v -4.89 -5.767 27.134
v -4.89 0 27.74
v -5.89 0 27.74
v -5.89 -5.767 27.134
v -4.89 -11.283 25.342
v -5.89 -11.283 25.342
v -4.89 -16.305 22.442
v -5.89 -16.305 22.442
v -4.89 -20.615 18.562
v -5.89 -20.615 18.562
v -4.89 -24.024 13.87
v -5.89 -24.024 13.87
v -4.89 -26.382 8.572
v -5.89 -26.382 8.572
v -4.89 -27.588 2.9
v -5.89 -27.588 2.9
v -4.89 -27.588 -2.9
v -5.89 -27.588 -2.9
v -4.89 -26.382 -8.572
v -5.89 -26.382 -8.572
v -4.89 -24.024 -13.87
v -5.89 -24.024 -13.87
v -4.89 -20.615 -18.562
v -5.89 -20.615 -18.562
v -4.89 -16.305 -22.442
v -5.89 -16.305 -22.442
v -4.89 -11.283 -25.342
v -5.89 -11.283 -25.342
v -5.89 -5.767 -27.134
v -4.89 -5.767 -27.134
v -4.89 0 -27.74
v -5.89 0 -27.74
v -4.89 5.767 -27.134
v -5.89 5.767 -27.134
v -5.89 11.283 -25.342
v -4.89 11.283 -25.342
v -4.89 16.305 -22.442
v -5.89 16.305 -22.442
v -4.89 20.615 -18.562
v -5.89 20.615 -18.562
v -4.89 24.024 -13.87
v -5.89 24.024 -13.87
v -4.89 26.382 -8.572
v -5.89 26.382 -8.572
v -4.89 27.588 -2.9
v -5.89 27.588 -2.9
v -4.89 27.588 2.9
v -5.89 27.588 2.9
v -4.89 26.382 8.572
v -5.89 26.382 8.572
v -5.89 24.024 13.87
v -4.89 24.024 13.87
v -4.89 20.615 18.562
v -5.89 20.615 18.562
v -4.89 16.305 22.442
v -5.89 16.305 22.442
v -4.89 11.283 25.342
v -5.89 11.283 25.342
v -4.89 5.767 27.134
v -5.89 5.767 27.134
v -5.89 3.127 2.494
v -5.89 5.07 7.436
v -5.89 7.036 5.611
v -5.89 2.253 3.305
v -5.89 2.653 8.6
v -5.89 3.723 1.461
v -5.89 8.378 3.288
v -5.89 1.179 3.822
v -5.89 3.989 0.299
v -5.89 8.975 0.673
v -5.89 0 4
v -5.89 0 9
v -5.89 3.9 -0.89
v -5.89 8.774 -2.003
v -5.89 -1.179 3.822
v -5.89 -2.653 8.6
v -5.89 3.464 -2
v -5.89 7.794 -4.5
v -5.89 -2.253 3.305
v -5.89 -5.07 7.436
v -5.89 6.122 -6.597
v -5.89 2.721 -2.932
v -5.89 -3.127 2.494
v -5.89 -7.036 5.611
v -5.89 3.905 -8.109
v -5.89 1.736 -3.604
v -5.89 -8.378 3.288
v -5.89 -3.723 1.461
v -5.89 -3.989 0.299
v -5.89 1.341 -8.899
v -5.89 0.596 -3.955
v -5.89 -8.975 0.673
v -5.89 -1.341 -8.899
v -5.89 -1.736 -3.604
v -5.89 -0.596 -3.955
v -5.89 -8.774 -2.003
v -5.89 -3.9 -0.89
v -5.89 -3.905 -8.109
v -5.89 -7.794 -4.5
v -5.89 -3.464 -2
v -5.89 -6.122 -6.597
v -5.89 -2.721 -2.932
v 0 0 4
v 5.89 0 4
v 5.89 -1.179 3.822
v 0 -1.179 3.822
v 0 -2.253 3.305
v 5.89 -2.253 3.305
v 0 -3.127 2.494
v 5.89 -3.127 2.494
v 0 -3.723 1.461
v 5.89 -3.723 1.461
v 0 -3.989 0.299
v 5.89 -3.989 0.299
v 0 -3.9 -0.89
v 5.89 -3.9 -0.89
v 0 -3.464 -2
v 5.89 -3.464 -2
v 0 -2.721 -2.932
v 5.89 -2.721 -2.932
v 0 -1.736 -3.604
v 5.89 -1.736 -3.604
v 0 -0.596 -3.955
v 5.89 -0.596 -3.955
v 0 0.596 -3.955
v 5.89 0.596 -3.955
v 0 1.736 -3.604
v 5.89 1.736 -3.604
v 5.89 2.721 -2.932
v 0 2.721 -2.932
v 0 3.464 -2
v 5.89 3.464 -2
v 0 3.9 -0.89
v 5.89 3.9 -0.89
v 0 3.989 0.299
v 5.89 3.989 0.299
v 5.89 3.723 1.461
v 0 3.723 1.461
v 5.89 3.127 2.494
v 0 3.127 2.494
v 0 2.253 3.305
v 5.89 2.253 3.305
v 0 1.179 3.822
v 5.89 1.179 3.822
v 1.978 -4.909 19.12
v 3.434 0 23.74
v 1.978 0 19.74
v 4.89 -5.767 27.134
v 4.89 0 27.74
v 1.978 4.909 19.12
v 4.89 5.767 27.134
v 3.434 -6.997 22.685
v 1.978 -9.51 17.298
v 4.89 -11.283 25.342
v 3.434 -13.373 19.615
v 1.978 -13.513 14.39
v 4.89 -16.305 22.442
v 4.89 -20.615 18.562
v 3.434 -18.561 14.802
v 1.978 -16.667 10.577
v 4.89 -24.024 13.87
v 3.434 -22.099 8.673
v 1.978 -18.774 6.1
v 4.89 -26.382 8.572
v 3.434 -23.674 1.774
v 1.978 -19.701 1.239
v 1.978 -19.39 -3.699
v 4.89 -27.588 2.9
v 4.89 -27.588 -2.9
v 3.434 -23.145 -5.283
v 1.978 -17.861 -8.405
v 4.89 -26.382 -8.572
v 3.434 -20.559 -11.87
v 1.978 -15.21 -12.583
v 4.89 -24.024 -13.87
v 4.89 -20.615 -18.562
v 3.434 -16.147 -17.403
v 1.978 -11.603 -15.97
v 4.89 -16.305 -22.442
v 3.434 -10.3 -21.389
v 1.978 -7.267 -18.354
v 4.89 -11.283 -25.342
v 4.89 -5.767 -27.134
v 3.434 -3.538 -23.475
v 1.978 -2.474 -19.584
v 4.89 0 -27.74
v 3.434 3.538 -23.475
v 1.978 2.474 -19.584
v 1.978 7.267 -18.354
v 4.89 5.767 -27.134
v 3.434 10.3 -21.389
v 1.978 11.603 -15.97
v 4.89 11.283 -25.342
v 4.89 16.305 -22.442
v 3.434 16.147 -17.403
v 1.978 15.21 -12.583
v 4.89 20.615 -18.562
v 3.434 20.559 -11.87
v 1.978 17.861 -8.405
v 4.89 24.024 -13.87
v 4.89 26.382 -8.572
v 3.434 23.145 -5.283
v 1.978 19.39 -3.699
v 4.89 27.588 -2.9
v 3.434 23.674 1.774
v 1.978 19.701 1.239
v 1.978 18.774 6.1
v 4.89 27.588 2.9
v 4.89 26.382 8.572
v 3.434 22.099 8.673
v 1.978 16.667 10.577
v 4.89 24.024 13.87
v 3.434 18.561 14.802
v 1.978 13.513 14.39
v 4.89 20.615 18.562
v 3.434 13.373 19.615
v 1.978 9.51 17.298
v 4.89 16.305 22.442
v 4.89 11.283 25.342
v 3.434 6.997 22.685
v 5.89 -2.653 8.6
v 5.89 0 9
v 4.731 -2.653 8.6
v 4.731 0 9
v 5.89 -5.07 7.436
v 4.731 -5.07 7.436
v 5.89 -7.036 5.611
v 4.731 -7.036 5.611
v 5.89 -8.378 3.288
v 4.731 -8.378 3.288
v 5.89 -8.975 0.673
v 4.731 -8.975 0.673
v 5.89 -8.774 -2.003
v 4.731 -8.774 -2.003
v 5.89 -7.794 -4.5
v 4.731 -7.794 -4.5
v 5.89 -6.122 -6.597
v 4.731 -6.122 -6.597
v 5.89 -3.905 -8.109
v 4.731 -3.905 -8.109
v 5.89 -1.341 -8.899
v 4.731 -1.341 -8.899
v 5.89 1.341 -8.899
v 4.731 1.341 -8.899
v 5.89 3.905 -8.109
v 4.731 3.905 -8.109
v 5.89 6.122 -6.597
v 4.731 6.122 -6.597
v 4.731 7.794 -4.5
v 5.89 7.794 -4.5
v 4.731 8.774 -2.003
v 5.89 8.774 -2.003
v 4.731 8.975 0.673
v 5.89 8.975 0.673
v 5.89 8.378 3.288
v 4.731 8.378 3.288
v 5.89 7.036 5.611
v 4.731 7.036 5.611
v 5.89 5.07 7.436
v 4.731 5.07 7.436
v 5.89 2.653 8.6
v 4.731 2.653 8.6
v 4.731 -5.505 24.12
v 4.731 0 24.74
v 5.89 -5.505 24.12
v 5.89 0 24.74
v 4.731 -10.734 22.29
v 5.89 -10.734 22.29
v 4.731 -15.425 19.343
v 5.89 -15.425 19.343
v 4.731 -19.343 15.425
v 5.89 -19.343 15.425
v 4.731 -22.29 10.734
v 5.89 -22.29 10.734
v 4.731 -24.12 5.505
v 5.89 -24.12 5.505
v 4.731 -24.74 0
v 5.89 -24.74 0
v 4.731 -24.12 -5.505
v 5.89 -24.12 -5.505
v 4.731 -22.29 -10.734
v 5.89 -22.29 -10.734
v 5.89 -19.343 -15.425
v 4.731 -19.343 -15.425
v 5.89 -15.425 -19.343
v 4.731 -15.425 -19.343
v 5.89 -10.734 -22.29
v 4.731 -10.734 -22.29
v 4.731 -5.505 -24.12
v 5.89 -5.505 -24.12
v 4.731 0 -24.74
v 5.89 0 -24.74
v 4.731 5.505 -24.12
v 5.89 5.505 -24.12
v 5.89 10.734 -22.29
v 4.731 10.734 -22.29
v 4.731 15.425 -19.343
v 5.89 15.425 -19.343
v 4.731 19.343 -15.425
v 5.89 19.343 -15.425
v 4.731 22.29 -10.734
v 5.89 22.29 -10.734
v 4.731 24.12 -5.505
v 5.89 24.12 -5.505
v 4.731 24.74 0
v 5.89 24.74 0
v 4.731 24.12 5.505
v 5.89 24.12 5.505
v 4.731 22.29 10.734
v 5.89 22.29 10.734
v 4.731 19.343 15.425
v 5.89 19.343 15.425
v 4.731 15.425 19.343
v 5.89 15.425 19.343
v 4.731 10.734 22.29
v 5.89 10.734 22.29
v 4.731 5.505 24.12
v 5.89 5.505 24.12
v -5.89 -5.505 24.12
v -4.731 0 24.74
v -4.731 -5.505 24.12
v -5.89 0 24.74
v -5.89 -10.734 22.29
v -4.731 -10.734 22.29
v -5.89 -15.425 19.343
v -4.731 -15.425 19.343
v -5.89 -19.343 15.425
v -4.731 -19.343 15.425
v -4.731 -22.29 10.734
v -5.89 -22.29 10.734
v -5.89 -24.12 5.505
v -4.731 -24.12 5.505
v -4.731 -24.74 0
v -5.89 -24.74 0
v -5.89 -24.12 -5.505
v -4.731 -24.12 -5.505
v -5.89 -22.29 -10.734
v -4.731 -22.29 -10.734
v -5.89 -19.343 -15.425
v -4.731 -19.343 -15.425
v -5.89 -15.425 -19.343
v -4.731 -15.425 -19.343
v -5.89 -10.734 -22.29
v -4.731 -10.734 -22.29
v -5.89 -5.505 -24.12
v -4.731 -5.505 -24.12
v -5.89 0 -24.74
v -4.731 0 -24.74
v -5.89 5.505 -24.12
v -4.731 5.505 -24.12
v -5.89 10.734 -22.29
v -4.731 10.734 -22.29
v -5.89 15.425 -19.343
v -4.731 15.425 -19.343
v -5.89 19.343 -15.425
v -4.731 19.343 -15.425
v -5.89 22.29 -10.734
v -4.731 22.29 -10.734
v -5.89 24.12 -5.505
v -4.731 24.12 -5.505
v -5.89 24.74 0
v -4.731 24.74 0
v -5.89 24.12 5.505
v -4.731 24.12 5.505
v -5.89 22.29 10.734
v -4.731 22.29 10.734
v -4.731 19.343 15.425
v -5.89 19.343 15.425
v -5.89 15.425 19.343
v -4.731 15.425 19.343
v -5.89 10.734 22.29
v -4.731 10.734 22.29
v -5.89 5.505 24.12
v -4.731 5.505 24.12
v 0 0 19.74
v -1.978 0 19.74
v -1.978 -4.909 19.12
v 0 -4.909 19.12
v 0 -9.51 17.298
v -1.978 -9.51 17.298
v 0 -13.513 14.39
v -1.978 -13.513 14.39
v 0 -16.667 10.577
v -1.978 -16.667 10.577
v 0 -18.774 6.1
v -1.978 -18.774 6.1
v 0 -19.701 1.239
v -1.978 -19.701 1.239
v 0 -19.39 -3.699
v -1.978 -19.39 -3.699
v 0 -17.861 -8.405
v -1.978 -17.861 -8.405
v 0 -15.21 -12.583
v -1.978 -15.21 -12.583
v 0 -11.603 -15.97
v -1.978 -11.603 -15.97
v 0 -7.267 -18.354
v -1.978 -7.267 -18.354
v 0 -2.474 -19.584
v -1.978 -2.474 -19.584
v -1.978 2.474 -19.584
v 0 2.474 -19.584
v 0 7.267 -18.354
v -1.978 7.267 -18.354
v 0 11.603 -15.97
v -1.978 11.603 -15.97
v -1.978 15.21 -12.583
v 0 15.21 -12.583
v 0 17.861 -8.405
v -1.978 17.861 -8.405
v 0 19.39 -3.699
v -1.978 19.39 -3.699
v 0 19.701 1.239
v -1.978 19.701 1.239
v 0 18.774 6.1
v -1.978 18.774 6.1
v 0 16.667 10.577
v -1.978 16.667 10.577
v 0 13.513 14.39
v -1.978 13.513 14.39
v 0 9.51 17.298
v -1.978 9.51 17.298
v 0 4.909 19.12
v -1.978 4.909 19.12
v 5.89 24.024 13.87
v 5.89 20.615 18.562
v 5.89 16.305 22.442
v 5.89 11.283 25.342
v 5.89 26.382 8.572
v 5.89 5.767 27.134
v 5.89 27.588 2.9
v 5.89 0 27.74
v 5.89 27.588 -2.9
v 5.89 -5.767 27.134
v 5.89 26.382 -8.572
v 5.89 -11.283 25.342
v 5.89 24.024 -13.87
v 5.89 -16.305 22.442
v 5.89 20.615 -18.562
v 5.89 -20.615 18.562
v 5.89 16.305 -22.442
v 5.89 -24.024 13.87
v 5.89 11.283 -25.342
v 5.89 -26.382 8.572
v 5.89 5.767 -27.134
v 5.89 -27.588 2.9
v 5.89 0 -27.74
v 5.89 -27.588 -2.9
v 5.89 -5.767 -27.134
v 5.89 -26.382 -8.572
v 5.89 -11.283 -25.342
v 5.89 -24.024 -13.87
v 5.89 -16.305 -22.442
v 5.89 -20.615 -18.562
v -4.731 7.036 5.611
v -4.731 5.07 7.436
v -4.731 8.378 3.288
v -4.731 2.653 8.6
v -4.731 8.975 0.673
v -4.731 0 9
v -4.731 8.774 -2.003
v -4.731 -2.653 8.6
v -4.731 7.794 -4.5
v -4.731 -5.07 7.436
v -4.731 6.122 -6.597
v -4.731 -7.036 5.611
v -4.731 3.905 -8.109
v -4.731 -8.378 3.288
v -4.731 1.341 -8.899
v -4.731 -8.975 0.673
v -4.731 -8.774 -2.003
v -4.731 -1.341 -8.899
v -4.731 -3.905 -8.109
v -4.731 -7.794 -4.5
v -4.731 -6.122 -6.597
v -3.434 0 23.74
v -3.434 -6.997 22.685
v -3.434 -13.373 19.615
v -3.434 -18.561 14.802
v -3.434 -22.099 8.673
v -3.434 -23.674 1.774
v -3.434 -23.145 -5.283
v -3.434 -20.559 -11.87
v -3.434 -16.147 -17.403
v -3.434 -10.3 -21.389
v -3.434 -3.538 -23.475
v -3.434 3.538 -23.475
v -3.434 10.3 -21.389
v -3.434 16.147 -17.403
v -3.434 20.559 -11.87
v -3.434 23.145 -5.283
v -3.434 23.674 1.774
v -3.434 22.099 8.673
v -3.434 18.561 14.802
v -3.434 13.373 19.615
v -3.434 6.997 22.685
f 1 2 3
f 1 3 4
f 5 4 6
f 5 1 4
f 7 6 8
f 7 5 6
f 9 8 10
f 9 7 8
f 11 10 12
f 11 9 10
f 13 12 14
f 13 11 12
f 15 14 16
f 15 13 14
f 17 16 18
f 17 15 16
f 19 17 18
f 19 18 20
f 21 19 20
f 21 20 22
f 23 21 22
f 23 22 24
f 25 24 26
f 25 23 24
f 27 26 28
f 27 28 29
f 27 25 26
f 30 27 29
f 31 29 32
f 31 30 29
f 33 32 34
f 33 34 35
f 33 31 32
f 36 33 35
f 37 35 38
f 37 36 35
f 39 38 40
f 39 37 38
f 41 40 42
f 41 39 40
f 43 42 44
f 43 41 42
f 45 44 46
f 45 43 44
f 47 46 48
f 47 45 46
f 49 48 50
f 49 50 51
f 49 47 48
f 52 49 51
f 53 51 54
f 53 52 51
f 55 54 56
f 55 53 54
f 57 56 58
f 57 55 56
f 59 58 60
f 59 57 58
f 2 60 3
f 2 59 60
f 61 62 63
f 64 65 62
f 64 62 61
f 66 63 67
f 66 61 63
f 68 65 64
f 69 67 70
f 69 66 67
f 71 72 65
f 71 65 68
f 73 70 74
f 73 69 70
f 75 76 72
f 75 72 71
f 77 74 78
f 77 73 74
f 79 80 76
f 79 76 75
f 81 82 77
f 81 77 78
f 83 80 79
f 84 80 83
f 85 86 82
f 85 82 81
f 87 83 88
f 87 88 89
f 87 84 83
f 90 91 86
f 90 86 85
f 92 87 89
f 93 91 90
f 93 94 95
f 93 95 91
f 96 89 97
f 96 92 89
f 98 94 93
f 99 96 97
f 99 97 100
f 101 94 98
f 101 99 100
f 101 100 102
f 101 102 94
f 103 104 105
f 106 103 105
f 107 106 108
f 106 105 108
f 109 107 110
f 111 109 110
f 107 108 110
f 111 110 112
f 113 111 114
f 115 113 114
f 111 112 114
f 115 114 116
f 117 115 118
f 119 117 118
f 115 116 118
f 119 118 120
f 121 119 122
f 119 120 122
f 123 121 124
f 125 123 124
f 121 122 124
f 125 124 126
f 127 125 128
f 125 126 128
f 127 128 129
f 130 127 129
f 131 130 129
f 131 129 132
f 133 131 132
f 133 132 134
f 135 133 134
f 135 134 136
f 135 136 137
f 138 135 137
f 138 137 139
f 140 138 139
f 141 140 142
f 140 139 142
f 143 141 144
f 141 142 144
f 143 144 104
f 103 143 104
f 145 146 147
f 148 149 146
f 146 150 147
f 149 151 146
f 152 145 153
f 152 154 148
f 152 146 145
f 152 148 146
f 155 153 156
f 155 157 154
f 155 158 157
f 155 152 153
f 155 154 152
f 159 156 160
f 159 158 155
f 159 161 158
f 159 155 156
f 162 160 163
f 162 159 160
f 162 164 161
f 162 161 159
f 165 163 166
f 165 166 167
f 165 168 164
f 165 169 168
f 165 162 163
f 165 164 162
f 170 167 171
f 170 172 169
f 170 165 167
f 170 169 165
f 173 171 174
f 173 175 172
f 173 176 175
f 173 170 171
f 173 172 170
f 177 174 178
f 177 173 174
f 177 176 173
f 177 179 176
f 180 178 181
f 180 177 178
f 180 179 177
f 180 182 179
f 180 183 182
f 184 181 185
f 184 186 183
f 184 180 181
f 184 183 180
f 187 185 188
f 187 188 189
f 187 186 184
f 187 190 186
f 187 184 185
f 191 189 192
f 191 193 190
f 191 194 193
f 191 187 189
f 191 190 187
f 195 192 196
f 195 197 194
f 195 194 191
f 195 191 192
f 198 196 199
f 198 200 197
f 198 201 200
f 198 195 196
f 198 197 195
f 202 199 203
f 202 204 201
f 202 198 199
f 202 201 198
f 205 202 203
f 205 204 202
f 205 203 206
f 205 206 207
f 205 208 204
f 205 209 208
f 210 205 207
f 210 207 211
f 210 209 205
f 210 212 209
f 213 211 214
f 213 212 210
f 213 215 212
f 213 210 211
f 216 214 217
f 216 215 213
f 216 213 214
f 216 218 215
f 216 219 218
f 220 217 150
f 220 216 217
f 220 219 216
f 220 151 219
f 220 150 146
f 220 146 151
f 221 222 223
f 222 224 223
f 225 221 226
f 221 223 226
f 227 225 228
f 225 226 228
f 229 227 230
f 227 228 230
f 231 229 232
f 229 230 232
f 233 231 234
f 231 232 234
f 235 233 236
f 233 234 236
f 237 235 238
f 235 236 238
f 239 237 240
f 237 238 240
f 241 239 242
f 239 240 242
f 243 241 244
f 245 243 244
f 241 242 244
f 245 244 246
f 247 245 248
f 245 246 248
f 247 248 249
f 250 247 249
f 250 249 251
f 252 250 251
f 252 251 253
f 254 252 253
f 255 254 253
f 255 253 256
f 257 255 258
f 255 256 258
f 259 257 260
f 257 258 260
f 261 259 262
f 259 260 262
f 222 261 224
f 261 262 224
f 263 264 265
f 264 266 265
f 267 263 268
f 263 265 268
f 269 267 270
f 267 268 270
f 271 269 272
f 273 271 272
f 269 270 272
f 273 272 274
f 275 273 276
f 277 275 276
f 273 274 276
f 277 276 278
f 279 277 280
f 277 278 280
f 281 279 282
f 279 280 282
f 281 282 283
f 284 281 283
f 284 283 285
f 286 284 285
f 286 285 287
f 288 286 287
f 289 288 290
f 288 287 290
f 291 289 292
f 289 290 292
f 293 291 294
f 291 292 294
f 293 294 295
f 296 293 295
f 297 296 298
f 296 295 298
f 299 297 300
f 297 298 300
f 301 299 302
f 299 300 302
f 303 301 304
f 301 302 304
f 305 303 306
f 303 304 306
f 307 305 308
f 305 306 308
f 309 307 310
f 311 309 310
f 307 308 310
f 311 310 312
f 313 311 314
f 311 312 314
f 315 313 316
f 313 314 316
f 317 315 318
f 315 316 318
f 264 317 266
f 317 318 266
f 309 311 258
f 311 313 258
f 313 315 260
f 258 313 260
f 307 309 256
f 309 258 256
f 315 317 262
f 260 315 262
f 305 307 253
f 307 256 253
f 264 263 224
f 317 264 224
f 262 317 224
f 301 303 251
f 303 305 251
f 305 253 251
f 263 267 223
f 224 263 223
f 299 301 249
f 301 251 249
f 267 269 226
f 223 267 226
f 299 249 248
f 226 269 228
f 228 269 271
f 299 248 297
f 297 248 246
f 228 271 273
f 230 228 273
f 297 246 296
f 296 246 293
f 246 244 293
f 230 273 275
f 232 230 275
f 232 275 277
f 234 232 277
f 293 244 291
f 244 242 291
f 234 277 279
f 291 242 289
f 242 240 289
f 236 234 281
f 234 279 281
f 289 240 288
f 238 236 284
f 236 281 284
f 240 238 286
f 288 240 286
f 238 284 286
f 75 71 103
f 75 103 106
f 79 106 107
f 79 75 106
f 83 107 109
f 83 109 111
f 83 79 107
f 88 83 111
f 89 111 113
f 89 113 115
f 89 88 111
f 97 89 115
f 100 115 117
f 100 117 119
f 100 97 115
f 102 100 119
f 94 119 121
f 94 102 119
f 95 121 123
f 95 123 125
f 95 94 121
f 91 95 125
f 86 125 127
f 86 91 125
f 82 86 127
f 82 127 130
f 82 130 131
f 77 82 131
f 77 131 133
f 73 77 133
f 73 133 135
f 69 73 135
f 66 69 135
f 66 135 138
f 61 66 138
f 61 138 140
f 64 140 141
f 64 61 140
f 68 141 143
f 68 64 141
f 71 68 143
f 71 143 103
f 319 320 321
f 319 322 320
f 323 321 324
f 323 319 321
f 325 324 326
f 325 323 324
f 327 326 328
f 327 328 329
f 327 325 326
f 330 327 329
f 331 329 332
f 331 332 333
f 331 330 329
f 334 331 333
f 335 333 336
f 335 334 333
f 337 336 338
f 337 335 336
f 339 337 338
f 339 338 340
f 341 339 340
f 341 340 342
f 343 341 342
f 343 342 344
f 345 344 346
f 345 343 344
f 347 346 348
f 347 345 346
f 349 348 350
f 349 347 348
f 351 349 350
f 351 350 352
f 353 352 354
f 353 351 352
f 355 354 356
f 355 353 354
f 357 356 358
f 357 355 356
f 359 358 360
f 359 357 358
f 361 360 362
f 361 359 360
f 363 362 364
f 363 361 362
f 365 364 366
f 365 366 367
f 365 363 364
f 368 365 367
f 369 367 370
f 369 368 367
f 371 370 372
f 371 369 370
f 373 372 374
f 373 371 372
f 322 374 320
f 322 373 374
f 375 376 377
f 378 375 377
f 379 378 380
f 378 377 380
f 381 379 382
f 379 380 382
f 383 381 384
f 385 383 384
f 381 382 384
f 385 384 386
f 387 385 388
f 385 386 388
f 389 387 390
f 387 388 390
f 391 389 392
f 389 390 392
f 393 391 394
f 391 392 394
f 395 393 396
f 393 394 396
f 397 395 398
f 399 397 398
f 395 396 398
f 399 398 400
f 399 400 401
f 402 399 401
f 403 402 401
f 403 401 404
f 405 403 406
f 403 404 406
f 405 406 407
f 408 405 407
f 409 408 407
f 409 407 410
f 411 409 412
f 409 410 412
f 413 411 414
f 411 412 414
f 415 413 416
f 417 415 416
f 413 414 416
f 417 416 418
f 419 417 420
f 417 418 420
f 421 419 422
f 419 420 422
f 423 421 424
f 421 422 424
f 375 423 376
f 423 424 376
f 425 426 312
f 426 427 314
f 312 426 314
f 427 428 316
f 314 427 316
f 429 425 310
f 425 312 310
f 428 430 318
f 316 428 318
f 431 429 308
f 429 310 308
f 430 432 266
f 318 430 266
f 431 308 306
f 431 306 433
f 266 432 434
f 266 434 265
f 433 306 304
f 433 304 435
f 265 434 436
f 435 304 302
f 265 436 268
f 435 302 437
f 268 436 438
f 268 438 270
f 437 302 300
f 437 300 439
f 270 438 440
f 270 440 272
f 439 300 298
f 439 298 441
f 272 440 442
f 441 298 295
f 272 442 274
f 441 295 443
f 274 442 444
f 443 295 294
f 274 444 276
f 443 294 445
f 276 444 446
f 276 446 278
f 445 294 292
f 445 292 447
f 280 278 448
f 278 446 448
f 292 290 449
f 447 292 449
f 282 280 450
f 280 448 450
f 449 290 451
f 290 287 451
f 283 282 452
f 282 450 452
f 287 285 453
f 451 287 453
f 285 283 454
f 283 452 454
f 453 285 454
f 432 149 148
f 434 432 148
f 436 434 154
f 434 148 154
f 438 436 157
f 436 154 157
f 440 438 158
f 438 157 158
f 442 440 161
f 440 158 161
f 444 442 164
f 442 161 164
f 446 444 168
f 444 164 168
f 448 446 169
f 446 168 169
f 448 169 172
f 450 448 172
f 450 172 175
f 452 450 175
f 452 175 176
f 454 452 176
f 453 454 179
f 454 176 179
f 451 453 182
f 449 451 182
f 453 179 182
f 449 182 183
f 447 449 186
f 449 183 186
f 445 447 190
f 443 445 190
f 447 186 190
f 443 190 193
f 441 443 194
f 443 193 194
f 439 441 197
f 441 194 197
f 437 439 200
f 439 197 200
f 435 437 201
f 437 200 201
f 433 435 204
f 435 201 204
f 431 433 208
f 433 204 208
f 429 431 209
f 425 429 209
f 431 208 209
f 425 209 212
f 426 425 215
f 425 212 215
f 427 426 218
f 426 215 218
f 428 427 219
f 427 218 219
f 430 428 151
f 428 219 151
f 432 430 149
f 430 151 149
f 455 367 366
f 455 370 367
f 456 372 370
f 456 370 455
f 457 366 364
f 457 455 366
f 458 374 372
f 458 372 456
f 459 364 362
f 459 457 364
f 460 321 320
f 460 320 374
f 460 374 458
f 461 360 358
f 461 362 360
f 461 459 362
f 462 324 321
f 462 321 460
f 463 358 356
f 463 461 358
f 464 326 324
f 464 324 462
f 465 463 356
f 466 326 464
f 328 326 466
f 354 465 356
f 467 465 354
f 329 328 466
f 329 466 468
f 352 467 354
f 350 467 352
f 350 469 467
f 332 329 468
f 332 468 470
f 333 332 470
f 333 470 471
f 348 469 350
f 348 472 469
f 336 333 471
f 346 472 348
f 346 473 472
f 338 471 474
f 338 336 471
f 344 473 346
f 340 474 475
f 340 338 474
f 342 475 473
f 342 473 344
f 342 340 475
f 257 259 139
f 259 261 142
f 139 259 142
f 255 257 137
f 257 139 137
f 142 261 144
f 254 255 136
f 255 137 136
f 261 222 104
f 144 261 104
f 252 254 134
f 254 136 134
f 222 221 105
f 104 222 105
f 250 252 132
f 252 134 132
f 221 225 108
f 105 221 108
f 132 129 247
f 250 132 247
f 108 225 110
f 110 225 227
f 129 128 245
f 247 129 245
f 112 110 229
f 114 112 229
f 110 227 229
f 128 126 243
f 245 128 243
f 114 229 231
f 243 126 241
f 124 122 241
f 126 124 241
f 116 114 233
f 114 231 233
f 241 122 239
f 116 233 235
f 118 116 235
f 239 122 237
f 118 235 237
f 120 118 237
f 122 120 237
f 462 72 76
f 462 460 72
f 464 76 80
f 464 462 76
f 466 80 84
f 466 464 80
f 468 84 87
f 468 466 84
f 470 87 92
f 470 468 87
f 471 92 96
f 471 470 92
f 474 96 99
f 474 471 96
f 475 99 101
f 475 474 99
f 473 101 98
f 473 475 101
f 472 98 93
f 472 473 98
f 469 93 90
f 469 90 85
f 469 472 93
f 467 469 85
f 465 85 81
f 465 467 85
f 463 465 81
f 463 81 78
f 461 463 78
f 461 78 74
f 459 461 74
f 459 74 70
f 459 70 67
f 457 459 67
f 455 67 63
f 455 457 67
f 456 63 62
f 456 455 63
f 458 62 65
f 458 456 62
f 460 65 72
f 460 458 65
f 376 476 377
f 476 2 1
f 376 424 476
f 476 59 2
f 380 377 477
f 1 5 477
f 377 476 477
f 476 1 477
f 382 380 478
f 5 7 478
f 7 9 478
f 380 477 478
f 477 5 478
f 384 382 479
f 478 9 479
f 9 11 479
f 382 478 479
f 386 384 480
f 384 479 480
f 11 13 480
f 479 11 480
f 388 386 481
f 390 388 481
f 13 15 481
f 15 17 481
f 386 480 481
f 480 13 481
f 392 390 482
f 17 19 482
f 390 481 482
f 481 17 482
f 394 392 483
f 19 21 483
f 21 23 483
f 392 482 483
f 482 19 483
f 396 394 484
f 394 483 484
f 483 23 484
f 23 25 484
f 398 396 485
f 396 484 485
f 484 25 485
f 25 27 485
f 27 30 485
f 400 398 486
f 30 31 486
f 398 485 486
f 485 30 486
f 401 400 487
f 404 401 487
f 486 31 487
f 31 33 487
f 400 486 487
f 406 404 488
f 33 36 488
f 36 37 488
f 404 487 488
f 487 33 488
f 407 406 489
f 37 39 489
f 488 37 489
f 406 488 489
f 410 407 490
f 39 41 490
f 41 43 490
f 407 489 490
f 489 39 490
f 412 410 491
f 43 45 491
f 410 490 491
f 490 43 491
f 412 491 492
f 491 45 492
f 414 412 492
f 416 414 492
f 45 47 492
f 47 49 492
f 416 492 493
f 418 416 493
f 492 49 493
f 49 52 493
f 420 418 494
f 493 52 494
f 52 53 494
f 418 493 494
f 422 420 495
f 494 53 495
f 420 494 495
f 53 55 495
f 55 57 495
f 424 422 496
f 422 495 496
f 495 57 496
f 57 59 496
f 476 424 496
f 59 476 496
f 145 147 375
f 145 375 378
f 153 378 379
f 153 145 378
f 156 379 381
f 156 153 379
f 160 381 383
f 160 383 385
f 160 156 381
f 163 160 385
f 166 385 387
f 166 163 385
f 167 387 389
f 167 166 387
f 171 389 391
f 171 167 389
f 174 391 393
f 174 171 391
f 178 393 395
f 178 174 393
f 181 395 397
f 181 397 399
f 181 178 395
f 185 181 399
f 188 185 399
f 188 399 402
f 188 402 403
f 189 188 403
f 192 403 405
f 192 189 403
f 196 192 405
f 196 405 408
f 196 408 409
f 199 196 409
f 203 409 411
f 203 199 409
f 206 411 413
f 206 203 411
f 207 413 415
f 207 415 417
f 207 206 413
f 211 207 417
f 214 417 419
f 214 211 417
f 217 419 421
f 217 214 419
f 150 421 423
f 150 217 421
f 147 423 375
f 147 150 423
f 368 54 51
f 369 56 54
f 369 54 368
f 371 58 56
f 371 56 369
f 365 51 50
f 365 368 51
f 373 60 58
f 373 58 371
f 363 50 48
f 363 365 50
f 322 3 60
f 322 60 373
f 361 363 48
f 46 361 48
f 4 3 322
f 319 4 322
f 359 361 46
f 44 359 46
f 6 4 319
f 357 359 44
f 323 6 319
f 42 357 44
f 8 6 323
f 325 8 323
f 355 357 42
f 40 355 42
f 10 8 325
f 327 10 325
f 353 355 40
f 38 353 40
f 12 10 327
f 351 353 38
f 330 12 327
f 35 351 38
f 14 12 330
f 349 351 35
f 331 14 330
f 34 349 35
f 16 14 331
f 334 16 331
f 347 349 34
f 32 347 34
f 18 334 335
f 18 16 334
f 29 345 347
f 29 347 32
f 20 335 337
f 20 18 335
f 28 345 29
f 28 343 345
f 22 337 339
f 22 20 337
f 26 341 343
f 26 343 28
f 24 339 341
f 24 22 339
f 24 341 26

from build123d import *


with BuildPart() as part:
    # Sketch1 → Revolve1 (revolve)
    with BuildSketch(Plane.XY, mode=Mode.PRIVATE) as revolve1_sk:
        Polygon((0, 4), (5.89, 4), (5.89, 9), (4.730911447, 9), (4.730911447, 24.74), (5.89, 24.74), (5.89, 27.74), (0, 27.74), align=None)
    revolve1 = revolve(revolve1_sk.sketch.rotate(Axis((0, 0, 0), (1, 0, 0)), 90), axis=Axis((0, 0, 0), (1, 0, 0)))

    # Sketch2 → Cut-Revolve1 (revolve, cut)
    with BuildSketch(Plane.XY, mode=Mode.PRIVATE) as cut_revolve1_sk:
        Polygon((0, 19.74), (1.977829822, 19.74), (4.889591697, 27.74), (0, 27.74), align=None)
    cut_revolve1 = revolve(cut_revolve1_sk.sketch.rotate(Axis((0, 0, 0), (1, 0, 0)), 90), axis=Axis((0, 0, 0), (1, 0, 0)), mode=Mode.SUBTRACT)

    # Mirror1: Revolve1, Cut-Revolve1 across plane
    add(revolve1.mirror(Plane(origin=(0, 27.74, 0), x_dir=(0, 0, 1), z_dir=(1, 0, 0))))
    add(cut_revolve1.mirror(Plane(origin=(0, 27.74, 0), x_dir=(0, 0, 1), z_dir=(1, 0, 0))), mode=Mode.SUBTRACT)


solid = part.part
